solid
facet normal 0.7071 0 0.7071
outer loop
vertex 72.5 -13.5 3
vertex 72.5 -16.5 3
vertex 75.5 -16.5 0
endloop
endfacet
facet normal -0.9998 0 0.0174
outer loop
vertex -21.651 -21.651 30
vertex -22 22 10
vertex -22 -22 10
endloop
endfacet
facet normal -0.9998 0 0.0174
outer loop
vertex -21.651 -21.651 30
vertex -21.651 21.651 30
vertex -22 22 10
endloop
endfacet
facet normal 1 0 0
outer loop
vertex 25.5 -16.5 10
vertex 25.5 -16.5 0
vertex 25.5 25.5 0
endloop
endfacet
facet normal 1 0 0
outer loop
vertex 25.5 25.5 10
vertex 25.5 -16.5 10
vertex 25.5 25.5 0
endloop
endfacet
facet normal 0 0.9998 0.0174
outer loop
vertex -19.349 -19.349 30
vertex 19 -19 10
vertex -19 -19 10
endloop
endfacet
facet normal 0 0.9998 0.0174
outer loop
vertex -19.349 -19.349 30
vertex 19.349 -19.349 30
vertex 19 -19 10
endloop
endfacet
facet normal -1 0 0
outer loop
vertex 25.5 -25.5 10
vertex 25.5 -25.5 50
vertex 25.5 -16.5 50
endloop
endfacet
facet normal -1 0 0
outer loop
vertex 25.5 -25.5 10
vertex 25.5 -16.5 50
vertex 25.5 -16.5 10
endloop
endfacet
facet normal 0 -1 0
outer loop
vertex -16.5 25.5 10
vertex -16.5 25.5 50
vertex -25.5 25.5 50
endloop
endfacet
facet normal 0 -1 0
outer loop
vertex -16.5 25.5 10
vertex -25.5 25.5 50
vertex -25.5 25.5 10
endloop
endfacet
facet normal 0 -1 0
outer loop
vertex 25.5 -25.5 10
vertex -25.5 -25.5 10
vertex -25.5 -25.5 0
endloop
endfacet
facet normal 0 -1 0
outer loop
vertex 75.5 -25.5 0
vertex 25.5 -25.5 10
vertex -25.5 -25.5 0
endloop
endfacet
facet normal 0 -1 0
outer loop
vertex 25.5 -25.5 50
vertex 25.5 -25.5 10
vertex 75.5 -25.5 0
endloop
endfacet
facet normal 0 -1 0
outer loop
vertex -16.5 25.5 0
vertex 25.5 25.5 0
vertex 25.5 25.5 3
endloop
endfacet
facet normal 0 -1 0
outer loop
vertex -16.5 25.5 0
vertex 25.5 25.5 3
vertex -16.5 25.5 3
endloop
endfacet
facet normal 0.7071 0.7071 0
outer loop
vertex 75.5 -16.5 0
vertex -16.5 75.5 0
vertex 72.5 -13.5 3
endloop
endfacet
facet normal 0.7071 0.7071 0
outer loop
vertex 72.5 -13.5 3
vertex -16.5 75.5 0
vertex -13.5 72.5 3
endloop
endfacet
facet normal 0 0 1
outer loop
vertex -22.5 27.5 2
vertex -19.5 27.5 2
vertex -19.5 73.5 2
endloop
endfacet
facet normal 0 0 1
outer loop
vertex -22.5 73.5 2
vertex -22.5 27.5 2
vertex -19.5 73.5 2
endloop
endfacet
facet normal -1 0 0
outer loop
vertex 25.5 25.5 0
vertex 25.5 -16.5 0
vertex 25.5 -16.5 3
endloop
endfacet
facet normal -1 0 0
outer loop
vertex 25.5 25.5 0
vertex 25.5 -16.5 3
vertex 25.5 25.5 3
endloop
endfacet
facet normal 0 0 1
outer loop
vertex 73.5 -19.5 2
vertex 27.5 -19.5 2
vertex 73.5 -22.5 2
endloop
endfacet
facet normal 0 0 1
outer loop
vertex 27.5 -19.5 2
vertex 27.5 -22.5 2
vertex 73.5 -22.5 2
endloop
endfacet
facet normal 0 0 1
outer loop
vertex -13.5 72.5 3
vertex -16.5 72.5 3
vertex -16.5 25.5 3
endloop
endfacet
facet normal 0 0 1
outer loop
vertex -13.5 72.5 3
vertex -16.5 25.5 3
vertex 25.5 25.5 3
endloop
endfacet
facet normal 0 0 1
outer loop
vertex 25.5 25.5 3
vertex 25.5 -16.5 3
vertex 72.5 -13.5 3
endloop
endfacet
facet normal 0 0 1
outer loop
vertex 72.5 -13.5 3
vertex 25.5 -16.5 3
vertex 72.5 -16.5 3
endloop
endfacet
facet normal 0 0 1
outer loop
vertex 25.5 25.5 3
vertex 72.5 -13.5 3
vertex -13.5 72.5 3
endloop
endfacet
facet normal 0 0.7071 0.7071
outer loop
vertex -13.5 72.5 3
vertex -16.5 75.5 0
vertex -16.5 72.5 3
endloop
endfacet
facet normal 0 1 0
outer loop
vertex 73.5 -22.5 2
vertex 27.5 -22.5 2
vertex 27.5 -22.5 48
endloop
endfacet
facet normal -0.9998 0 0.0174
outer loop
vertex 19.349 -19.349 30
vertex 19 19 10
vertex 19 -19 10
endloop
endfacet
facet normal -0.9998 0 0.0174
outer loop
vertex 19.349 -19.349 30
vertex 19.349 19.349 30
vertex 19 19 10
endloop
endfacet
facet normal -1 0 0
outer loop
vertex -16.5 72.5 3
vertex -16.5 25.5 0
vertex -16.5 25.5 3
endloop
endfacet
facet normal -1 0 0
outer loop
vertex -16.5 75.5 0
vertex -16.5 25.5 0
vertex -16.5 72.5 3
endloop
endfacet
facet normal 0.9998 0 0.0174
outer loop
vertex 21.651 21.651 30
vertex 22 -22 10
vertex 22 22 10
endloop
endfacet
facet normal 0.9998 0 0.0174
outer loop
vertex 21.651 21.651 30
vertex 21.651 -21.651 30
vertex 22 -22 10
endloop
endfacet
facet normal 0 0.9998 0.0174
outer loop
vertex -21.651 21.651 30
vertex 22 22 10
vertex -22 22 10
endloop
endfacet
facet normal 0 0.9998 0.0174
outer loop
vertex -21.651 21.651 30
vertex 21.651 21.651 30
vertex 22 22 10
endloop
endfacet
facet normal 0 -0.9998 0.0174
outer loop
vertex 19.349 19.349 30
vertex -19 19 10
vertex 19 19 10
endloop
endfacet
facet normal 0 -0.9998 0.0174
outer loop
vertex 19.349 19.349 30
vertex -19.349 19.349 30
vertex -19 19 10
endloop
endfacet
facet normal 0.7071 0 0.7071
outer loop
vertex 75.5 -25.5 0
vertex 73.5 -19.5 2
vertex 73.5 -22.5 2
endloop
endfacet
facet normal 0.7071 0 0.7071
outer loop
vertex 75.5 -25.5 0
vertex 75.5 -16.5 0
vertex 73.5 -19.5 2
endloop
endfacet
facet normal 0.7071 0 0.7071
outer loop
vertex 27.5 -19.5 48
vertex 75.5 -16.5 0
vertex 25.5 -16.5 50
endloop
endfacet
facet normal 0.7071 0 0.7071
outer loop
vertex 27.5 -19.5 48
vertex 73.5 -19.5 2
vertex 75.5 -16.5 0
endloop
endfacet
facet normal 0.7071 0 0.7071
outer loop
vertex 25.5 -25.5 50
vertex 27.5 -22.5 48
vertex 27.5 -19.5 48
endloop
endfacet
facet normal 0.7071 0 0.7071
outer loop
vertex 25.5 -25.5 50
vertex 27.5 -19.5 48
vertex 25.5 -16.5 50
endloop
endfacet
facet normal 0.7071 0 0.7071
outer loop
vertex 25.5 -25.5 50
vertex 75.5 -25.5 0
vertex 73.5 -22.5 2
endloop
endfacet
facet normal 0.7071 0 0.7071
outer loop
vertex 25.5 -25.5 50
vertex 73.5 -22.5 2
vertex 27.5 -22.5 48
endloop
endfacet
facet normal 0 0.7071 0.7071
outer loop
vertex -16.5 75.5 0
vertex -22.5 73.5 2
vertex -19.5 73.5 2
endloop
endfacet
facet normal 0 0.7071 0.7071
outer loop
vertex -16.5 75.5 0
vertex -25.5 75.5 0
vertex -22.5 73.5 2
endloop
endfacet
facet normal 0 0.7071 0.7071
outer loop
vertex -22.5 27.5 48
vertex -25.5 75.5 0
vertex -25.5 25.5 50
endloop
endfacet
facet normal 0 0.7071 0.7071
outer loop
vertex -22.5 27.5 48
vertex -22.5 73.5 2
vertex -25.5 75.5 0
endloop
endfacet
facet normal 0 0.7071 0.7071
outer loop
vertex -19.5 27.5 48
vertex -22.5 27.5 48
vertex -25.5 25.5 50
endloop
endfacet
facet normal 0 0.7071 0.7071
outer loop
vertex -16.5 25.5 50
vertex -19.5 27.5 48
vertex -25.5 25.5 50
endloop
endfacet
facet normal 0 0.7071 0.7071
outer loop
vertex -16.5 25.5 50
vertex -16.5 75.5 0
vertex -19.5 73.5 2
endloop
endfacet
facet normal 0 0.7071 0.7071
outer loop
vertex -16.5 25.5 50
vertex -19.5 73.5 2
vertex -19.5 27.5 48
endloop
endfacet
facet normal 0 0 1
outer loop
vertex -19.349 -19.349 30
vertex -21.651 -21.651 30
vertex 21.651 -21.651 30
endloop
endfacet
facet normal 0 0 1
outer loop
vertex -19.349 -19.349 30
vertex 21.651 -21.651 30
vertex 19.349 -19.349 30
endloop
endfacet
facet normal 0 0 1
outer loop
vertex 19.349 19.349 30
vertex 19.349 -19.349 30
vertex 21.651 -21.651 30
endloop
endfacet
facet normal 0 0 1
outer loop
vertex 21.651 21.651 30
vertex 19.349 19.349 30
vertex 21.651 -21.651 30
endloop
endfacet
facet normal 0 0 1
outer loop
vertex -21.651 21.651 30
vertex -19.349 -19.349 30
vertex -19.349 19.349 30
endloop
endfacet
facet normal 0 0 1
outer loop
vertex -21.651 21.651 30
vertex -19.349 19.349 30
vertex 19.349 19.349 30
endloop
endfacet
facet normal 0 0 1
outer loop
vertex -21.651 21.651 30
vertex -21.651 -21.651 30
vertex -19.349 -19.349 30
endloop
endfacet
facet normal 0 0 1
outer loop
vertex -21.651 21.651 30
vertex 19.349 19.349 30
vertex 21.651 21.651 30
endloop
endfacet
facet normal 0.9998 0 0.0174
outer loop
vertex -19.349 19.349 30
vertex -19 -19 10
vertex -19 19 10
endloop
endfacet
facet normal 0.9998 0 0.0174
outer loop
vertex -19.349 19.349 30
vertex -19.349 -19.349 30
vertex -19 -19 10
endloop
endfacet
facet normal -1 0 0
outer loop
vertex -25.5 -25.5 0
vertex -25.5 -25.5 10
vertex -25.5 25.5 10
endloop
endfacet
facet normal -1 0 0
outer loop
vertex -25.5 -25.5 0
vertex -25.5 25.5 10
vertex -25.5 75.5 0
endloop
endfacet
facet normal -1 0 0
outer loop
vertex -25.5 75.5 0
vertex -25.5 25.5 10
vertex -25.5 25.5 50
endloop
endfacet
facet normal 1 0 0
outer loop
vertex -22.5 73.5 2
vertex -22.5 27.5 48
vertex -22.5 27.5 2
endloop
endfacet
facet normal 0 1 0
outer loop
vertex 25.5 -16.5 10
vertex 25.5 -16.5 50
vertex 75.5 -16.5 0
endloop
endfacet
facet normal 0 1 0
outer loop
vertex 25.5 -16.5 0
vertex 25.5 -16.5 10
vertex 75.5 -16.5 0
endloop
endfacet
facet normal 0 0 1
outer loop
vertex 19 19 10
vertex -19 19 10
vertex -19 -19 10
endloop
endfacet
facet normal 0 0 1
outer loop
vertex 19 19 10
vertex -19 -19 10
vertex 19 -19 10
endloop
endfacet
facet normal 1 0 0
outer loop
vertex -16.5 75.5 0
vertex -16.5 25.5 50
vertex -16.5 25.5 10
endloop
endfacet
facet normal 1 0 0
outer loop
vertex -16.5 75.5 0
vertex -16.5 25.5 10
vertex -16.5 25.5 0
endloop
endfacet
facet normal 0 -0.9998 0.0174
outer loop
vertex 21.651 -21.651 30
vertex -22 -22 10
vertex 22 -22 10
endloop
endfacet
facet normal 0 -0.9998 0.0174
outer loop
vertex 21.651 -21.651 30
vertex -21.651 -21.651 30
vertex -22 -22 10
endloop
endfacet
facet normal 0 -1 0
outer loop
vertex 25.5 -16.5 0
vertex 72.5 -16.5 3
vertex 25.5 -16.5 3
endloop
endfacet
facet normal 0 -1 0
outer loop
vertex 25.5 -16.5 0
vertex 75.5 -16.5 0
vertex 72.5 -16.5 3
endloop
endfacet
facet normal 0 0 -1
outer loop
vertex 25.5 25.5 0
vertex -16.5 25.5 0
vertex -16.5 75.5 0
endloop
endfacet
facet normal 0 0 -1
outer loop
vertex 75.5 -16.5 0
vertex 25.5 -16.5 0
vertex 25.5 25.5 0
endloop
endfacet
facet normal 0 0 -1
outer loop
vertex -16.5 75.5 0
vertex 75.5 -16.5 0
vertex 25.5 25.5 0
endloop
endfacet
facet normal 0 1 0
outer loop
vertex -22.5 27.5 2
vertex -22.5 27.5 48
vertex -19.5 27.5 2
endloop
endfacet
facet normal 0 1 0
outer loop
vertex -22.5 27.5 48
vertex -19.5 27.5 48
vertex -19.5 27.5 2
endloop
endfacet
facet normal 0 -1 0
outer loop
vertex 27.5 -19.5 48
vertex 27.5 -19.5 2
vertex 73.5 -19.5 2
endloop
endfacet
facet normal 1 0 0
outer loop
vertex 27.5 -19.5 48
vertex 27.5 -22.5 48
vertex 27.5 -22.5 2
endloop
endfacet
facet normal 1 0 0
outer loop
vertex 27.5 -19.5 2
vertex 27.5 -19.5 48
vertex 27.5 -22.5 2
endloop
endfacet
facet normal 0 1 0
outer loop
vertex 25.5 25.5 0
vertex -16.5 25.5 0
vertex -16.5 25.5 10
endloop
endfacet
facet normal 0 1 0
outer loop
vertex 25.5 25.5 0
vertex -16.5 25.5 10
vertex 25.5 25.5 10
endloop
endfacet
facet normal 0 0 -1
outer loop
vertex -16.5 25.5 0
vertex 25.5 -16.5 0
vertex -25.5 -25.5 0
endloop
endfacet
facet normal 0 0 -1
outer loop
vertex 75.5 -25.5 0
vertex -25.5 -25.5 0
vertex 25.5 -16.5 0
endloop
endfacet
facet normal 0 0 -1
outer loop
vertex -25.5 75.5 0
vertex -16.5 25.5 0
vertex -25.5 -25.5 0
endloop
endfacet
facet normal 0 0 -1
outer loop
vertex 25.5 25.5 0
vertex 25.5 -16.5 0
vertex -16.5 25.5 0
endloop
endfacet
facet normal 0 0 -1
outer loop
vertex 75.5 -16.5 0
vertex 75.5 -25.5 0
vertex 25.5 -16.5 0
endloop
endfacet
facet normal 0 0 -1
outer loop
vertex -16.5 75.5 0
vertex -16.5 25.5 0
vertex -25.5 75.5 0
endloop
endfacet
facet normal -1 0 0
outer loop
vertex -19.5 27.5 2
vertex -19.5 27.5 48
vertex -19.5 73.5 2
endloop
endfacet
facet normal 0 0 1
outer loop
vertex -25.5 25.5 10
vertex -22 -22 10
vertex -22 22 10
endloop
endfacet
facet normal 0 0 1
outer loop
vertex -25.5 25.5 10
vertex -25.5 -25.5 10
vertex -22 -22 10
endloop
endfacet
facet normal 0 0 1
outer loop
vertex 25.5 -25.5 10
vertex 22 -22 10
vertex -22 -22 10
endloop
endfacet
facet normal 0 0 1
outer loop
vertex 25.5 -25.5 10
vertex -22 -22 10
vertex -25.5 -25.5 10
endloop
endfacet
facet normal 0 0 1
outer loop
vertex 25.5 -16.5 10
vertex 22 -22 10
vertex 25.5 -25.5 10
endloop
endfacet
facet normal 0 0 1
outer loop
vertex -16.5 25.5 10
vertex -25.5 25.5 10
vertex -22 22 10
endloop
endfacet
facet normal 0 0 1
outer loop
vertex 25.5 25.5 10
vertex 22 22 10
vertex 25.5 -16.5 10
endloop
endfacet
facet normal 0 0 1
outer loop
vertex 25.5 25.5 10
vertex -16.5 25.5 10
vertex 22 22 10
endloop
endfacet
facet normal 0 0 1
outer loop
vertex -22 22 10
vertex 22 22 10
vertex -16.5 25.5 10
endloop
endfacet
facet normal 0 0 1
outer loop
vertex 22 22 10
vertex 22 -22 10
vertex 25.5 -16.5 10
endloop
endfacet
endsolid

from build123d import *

# Parameters (mm, degrees)
F0_W      = 51
F0_H      = 51
F1_DEPTH  = 10
F4_DEPTH  = 4.5
F6_DEPTH  = 1.5
F9_DEPTH  = 4.5
F11_DEPTH = 1.5
F12_W     = 44
F12_H     = 44
F12_W_2   = 38
F12_H_2   = 38
F13_DEPTH = 20
F13_TAPER = 1
F15_DEPTH = 3
F17_DEPTH = 25
F19_DEPTH = 25


with BuildPart() as f1:
    # F0 (on Top) → F1 (new body)
    with BuildSketch(Plane.XY):
        Rectangle(F0_W, F0_H)
    extrude(amount=F1_DEPTH)

    # F3 (on offset) → F4 (join, symmetric)
    with BuildSketch(Plane.XZ.offset(21)):
        Polygon((25.5, 50), (25.5, 0), (75.5, 0), align=None)
    extrude(amount=F4_DEPTH, both=True)

    # F5 (on offset) → F6 (cut, symmetric)
    with BuildSketch(Plane.XZ.offset(21)):
        Polygon((73.5, 2), (27.5, 48), (27.5, 2), align=None)
    extrude(amount=F6_DEPTH, both=True, mode=Mode.SUBTRACT)

    # F8 (on offset) → F9 (join, symmetric)
    with BuildSketch(Plane.YZ.offset(-21)):
        Polygon((25.5, 50), (25.5, 0), (75.5, 0), align=None)
    extrude(amount=F9_DEPTH, both=True)

    # F10 (on offset) → F11 (cut, symmetric)
    with BuildSketch(Plane.YZ.offset(-21)):
        Polygon((27.5, 48), (27.5, 2), (73.5, 2), align=None)
    extrude(amount=F11_DEPTH, both=True, mode=Mode.SUBTRACT)

    # F12 (on face) → F13 (join)
    with BuildSketch(Plane.XY.offset(10)):
        Rectangle(F12_W, F12_H)
        Rectangle(F12_W_2, F12_H_2, mode=Mode.SUBTRACT)
    extrude(amount=F13_DEPTH, taper=F13_TAPER)


with BuildPart() as f15:
    # F14 (on face) → F15 (new body)
    with BuildSketch(Plane(origin=(0, 0, 0), x_dir=(1, 0, 0), z_dir=(0, 0, -1))):
        Polygon((-16.5, -25.5), (-16.5, -75.5), (75.5, 16.5), (25.5, 16.5), (25.5, -25.5), align=None)
    extrude(amount=-F15_DEPTH)

    # F16 (on face) → F17 (cut)
    with BuildSketch(Plane(origin=(-16.5, 0, 0), x_dir=(0, -1, 0), z_dir=(-1, 0, 0))):
        Polygon((-72.5, 3), (-75.5, 3), (-75.5, 0), align=None)
    extrude(amount=-F17_DEPTH, mode=Mode.SUBTRACT)

    # F18 (on face) → F19 (cut)
    with BuildSketch(Plane.XZ.offset(16.5)):
        Polygon((75.5, 0), (75.5, 3), (72.5, 3), align=None)
    extrude(amount=-F19_DEPTH, mode=Mode.SUBTRACT)


solid = Compound([f1.part, f15.part])
